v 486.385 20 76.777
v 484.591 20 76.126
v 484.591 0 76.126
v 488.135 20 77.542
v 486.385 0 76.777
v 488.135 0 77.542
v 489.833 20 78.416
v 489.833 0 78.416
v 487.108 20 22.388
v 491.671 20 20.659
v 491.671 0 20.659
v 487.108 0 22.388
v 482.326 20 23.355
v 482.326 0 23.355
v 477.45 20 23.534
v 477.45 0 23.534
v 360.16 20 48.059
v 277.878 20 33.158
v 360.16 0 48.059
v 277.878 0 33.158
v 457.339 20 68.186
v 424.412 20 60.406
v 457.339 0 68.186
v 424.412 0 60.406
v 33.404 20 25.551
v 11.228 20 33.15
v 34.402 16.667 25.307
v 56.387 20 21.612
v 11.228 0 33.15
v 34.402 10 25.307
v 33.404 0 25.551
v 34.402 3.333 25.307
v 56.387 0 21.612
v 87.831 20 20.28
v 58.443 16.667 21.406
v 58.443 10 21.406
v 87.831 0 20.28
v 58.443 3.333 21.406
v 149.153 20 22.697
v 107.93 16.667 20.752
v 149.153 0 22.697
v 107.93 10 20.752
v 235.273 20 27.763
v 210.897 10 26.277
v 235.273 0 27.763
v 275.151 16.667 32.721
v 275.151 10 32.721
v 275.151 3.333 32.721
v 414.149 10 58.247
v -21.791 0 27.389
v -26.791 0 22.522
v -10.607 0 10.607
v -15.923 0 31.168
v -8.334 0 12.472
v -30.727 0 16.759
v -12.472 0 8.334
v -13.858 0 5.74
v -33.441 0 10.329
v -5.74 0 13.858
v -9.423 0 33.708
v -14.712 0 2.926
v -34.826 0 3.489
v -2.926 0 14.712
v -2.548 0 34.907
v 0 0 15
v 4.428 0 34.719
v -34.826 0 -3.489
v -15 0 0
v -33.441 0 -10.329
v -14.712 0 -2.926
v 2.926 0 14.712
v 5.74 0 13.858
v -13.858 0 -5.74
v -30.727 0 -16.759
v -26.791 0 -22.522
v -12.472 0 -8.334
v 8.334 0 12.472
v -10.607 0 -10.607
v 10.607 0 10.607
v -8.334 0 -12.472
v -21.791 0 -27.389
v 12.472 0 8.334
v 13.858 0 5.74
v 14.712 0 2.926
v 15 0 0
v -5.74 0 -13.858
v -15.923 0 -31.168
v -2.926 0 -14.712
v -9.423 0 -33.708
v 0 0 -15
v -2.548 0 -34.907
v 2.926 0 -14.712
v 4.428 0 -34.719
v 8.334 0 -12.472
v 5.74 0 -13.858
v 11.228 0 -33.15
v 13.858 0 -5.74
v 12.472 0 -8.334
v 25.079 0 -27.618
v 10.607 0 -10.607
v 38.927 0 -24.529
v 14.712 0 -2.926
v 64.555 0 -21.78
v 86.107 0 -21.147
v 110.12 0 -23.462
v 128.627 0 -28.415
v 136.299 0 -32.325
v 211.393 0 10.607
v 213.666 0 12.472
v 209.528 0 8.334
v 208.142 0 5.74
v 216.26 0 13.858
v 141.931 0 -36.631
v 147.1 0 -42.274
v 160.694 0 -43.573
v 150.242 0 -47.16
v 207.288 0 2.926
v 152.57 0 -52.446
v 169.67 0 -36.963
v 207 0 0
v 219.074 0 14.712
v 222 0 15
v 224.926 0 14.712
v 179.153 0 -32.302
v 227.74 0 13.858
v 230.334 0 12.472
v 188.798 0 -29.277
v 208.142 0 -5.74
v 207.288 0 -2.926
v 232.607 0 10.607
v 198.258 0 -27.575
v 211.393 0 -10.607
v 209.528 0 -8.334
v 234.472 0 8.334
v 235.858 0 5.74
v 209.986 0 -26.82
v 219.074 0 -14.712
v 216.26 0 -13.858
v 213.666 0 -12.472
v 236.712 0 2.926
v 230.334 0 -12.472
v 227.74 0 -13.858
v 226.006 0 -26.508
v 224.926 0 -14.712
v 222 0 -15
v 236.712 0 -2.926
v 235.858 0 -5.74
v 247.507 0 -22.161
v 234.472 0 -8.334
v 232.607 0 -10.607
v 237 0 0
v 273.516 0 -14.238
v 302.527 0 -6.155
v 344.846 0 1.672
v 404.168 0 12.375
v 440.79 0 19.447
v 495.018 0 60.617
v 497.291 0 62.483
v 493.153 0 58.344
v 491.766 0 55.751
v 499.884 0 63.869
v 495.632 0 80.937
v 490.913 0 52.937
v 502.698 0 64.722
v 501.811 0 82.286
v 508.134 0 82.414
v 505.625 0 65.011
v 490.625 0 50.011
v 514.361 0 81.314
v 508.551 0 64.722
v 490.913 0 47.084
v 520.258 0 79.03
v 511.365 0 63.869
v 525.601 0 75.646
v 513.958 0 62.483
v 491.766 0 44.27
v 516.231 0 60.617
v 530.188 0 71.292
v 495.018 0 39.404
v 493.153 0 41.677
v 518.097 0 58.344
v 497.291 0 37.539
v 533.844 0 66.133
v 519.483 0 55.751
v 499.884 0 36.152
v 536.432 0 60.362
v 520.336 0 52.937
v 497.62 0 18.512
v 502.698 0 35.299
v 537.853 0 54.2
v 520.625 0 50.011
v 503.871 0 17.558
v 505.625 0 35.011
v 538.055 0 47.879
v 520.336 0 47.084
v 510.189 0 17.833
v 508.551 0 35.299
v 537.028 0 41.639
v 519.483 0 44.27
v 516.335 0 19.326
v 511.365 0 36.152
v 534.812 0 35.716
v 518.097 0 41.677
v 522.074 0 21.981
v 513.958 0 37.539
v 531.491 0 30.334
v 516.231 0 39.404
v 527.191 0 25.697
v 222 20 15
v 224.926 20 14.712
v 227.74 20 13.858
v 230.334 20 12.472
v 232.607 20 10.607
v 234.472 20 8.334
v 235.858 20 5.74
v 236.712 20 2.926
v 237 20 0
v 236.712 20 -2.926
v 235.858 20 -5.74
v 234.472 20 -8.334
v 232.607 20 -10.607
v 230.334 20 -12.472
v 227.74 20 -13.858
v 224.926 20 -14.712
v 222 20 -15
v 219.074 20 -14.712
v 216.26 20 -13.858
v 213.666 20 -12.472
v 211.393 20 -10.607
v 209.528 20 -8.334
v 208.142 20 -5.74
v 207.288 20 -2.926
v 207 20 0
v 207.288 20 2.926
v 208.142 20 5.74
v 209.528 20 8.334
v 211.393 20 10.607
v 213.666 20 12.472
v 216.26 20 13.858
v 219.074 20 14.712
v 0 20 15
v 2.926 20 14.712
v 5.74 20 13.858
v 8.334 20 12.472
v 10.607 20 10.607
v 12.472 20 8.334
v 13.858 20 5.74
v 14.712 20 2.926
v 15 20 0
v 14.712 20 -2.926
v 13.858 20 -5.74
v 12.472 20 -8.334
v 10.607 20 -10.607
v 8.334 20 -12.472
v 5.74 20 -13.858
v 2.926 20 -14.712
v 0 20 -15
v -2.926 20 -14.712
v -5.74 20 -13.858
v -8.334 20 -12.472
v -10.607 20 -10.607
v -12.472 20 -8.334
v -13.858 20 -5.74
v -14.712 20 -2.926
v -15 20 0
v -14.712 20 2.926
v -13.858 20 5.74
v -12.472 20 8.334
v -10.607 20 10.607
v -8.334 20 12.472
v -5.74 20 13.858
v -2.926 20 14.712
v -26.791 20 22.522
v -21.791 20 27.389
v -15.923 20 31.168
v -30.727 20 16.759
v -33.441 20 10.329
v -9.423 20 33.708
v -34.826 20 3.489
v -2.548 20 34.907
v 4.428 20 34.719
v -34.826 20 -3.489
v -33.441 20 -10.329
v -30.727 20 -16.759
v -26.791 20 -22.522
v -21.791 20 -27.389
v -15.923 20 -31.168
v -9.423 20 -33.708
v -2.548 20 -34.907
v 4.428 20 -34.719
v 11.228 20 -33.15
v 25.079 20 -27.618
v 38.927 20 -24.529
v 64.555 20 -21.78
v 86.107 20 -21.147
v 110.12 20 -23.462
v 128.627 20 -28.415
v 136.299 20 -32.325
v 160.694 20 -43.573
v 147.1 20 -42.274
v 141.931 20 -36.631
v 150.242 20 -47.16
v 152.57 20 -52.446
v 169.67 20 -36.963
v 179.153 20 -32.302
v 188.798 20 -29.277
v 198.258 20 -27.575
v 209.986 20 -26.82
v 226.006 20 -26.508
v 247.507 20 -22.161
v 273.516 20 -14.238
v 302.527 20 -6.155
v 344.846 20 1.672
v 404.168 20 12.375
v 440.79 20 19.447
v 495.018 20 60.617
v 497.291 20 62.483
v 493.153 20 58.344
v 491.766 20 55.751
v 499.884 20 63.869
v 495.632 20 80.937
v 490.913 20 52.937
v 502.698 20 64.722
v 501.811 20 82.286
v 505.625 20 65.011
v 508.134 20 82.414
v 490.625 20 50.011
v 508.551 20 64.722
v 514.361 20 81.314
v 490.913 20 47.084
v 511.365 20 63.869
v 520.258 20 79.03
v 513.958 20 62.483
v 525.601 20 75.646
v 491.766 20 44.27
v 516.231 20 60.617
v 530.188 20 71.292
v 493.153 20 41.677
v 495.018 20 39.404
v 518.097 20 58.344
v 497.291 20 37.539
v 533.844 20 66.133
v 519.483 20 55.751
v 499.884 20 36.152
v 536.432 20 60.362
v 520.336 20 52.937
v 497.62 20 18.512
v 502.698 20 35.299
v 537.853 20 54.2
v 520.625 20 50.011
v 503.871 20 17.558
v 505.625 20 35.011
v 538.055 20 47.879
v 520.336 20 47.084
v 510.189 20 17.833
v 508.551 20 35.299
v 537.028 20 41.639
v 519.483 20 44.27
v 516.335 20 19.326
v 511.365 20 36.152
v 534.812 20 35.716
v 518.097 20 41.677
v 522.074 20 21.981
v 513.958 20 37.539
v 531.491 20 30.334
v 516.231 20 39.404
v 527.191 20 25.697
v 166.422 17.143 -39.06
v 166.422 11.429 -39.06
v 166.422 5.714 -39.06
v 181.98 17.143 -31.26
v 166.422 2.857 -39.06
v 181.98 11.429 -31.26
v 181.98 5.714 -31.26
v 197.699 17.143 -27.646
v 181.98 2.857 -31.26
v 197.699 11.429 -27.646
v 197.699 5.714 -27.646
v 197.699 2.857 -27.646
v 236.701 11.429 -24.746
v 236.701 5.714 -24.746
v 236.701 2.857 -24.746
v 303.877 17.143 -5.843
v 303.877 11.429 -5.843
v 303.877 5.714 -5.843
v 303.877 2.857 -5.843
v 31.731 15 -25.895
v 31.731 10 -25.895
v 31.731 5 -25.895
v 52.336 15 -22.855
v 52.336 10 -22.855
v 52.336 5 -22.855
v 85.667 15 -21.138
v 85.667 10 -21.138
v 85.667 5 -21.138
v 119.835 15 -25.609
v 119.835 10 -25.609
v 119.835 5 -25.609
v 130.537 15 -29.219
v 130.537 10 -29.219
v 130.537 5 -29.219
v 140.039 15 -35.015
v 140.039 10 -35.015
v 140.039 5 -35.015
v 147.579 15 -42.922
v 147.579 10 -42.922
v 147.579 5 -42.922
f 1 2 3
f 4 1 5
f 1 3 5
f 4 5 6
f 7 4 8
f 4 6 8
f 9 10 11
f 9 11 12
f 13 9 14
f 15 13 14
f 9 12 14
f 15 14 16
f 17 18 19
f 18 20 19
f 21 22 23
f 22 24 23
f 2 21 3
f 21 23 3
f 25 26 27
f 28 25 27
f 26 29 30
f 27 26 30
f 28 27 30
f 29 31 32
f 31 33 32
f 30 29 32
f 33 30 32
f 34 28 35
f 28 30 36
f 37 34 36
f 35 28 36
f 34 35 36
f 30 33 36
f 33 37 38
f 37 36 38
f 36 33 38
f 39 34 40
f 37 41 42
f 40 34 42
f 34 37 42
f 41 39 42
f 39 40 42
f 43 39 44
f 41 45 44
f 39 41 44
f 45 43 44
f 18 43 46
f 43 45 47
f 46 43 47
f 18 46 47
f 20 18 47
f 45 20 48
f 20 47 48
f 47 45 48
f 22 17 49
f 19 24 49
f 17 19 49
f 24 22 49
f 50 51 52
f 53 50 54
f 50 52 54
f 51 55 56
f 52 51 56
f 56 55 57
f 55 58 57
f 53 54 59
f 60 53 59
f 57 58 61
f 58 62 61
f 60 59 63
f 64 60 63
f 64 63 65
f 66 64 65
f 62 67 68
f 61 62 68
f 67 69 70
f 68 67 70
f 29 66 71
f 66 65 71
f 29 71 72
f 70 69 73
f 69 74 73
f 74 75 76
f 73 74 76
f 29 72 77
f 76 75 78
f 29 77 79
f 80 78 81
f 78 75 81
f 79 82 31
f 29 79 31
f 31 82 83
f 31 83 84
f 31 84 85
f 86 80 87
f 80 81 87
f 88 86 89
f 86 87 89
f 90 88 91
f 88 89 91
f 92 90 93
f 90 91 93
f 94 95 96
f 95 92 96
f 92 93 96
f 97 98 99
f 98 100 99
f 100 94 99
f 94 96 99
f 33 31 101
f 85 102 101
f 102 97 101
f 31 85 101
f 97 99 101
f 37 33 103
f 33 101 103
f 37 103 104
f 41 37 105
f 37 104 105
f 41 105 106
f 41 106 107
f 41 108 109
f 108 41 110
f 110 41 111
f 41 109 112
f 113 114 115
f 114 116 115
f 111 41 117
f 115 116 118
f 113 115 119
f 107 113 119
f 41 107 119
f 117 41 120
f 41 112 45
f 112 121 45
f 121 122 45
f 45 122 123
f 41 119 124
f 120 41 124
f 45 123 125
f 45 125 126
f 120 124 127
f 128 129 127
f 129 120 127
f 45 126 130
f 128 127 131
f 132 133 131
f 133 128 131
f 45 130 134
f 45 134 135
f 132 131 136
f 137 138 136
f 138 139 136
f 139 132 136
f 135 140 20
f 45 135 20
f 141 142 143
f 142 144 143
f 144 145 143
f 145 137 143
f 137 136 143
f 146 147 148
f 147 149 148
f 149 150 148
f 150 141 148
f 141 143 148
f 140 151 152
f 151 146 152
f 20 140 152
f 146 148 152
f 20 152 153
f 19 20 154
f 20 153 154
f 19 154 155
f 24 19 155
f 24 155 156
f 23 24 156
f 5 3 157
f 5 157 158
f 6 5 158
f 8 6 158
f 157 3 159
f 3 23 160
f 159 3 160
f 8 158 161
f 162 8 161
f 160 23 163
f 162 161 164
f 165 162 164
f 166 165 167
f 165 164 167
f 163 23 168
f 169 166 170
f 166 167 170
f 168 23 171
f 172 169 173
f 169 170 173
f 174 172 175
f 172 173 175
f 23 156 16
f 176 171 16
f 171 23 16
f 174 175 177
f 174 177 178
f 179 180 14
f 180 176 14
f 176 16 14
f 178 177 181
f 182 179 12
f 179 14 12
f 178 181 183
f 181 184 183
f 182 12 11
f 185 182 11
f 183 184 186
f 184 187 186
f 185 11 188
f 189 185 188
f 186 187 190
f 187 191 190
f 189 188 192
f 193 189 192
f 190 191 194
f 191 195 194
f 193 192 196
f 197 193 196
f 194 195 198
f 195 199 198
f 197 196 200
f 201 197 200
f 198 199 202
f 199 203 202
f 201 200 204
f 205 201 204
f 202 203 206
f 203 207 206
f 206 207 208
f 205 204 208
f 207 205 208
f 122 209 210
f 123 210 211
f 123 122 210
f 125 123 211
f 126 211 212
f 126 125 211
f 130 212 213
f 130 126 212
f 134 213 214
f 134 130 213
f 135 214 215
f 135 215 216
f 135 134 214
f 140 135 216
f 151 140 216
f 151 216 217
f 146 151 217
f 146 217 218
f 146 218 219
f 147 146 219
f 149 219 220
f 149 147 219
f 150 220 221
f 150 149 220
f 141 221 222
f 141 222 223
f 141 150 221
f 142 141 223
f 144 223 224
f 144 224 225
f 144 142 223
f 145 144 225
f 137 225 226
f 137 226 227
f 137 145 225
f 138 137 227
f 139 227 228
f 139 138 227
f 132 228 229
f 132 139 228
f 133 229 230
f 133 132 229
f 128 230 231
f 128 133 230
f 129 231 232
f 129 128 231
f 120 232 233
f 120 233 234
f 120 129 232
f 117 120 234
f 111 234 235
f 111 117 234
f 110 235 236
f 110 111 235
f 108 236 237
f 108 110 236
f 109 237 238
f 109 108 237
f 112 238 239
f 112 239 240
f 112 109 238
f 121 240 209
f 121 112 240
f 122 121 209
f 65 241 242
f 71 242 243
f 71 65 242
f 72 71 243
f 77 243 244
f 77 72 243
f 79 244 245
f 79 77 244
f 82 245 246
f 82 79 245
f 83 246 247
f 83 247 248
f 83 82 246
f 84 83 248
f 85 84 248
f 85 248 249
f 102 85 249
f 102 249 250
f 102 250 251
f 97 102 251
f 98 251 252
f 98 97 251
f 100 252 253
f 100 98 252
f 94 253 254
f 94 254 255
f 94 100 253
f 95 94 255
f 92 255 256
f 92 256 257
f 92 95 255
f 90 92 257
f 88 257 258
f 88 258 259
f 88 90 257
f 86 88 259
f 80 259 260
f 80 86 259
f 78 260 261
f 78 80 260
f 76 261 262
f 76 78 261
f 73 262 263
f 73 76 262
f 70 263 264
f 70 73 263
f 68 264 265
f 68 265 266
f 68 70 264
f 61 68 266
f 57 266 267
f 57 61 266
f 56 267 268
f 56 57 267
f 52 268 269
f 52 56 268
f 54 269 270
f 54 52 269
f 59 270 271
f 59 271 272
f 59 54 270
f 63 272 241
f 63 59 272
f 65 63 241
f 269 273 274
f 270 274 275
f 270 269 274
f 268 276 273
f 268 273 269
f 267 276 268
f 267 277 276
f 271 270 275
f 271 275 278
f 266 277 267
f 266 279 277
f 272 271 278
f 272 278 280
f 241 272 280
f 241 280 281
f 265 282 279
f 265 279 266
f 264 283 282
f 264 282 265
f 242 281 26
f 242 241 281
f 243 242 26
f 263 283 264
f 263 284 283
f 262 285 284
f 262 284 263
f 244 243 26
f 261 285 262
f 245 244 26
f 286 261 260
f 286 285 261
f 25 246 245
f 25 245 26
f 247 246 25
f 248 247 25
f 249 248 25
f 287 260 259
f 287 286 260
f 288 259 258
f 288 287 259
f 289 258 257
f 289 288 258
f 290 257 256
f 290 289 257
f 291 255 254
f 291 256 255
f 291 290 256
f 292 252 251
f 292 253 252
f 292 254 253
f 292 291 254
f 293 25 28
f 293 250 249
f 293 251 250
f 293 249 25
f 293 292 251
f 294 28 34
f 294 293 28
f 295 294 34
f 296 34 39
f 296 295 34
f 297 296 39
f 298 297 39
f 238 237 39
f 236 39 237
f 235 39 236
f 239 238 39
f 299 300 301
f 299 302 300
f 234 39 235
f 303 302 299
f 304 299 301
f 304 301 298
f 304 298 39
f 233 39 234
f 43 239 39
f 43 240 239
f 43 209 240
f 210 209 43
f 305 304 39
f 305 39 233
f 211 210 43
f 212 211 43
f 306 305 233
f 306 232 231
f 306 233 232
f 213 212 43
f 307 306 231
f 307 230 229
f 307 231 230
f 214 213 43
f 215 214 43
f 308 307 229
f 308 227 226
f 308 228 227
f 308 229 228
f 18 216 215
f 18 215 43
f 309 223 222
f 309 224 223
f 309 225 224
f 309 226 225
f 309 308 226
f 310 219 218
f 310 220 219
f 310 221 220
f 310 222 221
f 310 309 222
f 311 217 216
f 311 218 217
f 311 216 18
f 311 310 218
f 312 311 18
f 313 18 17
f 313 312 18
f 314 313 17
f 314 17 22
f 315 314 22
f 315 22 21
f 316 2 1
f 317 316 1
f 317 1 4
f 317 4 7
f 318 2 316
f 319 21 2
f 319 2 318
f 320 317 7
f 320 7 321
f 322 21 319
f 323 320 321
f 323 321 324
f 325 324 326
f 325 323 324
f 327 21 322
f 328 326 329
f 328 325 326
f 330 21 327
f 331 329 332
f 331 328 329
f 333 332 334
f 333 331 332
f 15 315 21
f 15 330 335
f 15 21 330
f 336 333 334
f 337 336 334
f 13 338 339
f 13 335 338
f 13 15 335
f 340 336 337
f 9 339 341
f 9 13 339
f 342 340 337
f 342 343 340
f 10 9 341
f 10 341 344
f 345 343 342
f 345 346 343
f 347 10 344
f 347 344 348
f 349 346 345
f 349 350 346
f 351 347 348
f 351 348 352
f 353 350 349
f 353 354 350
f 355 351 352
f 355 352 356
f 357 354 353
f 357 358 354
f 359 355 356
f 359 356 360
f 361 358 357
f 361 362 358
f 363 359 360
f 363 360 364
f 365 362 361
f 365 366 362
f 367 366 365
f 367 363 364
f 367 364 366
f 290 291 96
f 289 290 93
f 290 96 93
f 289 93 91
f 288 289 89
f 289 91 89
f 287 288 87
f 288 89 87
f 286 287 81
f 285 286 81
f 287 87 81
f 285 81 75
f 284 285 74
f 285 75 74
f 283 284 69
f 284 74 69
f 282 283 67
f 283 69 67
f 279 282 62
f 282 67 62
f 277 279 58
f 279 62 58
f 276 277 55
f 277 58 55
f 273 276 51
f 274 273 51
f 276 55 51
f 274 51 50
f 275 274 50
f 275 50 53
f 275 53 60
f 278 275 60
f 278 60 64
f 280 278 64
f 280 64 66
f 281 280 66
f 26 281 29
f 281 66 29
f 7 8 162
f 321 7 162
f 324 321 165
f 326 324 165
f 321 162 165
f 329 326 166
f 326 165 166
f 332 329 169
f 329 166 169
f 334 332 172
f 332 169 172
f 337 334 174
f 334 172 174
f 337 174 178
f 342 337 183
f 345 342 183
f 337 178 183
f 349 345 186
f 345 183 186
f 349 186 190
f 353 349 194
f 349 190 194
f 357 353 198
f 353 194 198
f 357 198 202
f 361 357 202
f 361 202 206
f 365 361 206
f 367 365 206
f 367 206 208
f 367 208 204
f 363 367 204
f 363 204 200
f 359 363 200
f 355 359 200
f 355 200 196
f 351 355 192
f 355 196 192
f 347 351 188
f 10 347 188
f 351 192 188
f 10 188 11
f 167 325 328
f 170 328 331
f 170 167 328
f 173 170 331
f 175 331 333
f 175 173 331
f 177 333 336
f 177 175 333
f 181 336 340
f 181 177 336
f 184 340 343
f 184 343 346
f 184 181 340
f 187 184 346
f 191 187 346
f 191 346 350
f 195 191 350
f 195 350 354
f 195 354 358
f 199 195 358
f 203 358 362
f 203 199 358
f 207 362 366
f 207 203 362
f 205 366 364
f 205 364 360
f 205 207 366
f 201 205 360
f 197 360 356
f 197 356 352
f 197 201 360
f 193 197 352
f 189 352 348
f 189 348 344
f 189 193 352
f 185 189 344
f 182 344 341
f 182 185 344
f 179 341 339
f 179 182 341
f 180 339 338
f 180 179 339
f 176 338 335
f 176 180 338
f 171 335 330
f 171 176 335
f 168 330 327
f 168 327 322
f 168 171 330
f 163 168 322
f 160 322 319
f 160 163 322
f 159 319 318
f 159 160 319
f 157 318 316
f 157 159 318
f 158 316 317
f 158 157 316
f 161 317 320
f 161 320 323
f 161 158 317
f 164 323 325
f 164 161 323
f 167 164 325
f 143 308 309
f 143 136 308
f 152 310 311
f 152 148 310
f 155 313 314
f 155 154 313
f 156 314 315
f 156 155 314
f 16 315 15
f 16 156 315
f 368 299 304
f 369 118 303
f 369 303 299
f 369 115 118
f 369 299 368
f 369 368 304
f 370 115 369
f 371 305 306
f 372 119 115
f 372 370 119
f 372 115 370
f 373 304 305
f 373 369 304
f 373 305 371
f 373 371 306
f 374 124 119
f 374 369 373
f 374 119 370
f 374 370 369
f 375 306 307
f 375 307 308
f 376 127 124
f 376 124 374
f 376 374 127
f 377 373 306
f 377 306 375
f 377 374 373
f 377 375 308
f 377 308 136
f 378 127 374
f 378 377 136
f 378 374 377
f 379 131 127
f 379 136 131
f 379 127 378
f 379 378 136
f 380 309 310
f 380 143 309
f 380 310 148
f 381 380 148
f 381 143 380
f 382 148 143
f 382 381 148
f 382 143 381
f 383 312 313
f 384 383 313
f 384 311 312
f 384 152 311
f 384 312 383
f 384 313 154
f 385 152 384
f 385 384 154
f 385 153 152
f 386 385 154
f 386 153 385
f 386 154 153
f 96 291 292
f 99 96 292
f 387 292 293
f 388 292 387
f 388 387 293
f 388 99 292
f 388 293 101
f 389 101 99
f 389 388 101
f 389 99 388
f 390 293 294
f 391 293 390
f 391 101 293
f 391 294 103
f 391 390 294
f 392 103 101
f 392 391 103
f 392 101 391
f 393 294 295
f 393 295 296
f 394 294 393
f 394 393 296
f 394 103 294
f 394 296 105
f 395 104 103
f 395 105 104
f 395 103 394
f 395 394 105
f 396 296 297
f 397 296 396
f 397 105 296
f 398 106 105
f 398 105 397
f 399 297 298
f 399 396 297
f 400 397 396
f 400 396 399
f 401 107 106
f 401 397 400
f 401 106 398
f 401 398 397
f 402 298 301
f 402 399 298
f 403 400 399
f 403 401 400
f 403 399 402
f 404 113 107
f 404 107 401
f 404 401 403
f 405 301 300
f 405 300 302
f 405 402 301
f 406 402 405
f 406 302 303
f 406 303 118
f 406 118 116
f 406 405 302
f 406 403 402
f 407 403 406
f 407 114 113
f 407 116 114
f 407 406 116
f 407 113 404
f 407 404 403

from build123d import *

# Parameters (mm, degrees)
SKETCH1_R           = 15
BOSS_EXTRUDE1_DEPTH = 20


with BuildPart() as part:
    # Sketch1 → Boss-Extrude1 (new body)
    with BuildSketch(Plane(origin=(0, 0, 0), x_dir=(1, 0, 0), z_dir=(0, 1, 0))):
        with BuildLine():
            ThreePointArc((11.227844922, 33.150196054), (-35, 0), (11.227844922, -33.150196054))
            add(Edge.make_bspline(
                [(11.227844922, -33.150196054), (41.416756554, -19.545808717), (109.617018015, -19.594351387), (185.823720385, -25.106561365), (260.889286261, -28.726337393), (314.998938133, -40.103473751), (397.029783508, -54.530146852), (449.771483959, -64.724410895), (484.590684969, -76.125683189)],
                knots=[0, 0, 0, 0, 0.199281033, 0.408196703, 0.458288105, 0.673316503, 0.728275548, 0.981000001, 0.981000001, 0.981000001, 0.981000001], degree=3))
            ThreePointArc((484.590684969, -76.125683189), (487.266305561, -77.14558579), (489.832502579, -78.415932093))
            ThreePointArc((489.832502579, -78.415932093), (538.108178019, -51.044742092), (491.671127053, -20.658508715))
            ThreePointArc((491.671127053, -20.658508715), (484.736802135, -22.969082695), (477.449535042, -23.534195515))
            add(Edge.make_bspline(
                [(152.56997847, 52.446429488), (169.216290541, 30.251346727), (199.499803962, 25.985470169), (229.531039993, 27.599739832), (258.115601287, 19.371257227), (295.67818393, 6.785427982), (325.978973641, 0.976639679), (396.041080311, -9.067135125), (440.0323422, -21.859432111), (477.449535042, -23.534195515)],
                knots=[0, 0, 0, 0, 0.156649967, 0.187428866, 0.294415647, 0.335473832, 0.556952529, 0.622371723, 0.961980935, 0.961980935, 0.961980935, 0.961980935], degree=3))
            add(Edge.make_bspline(
                [(11.227844922, 33.150196054), (24.935887318, 26.125648633), (59.92557902, 21.305654623), (100.800901739, 19.39116832), (138.449474199, 31.26413754), (149.180734347, 42.659021766), (152.56997847, 52.446429488)],
                knots=[0, 0, 0, 0, 0.279361214, 0.721038744, 0.798623592, 1, 1, 1, 1], degree=3))
        make_face()
        with Locations(Location((0, 0, 0), (0, 0, 270))):
            Circle(SKETCH1_R, mode=Mode.SUBTRACT)
        with Locations(Location((222, 0, 0), (0, 0, 270))):
            Circle(SKETCH1_R, mode=Mode.SUBTRACT)
        with Locations(Location((505.624632868, -50.010675168, 0), (0, 0, 270))):
            Circle(SKETCH1_R, mode=Mode.SUBTRACT)
    extrude(amount=BOSS_EXTRUDE1_DEPTH)


solid = part.part
